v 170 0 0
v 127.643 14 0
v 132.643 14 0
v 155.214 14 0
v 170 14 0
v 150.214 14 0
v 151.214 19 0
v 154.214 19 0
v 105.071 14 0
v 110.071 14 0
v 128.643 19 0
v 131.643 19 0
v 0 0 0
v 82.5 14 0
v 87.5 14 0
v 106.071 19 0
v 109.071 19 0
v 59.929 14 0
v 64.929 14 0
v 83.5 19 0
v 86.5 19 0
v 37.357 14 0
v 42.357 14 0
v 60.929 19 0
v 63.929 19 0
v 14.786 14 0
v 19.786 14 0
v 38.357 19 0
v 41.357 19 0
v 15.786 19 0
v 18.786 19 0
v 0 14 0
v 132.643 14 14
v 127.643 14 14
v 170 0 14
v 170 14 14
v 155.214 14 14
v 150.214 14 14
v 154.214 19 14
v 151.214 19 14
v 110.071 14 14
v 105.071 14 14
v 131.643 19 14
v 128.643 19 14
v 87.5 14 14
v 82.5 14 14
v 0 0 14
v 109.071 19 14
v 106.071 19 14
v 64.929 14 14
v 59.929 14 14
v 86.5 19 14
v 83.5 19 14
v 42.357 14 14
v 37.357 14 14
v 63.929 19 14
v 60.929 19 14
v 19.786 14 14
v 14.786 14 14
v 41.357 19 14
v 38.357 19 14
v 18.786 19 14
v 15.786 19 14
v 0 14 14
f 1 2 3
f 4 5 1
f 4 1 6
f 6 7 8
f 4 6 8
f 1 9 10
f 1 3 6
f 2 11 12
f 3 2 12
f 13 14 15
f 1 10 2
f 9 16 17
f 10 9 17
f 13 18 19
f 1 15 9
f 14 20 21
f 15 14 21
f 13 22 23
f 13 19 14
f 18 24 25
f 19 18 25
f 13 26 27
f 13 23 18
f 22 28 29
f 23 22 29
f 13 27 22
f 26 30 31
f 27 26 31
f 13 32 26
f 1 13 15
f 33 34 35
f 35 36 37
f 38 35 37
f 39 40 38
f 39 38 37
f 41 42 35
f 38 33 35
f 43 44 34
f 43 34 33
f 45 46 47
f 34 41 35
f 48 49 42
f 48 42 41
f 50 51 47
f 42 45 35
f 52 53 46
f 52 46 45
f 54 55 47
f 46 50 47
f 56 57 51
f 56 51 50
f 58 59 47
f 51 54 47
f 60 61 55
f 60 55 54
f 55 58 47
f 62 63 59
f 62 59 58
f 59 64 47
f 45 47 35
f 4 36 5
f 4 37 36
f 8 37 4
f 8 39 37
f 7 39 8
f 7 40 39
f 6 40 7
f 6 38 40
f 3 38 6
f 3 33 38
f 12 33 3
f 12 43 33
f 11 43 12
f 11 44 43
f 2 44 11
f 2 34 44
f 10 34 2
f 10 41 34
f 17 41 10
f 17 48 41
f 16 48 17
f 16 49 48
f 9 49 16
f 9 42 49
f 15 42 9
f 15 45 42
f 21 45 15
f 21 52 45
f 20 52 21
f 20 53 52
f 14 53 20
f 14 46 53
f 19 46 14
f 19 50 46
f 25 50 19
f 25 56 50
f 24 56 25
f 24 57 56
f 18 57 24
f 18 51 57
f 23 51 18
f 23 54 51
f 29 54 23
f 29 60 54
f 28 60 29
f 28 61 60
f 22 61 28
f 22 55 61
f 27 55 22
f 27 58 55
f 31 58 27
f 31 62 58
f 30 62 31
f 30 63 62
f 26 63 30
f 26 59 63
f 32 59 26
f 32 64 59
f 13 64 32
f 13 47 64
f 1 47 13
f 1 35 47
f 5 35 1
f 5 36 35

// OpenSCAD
$fn = 32;

// ----------------------------------------------------------------------
// Gear rack: 7 teeth on a 170 mm bar, pitch 22.57 mm
// ----------------------------------------------------------------------

// --- parameters (mm) ---
profile_height = 14;      // extrusion height
profile_points = 32;      // points of the closed outline

profile = [[0, 0], [170, 0], [170, 14], [155.214, 14], [154.214, 19], [151.214, 19], [150.214, 14], [132.643, 14], [131.643, 19], [128.643, 19], [127.643, 14], [110.071, 14], [109.071, 19], [106.071, 19], [105.071, 14], [87.5, 14], [86.5, 19], [83.5, 19], [82.5, 14], [64.929, 14], [63.929, 19], [60.929, 19], [59.929, 14], [42.357, 14], [41.357, 19], [38.357, 19], [37.357, 14], [19.786, 14], [18.786, 19], [15.786, 19], [14.786, 14], [0, 14]];  // single closed polygon, 32 points, counter clockwise

// --- the one profile operation ---
linear_extrude(height = profile_height) polygon(points = profile);
